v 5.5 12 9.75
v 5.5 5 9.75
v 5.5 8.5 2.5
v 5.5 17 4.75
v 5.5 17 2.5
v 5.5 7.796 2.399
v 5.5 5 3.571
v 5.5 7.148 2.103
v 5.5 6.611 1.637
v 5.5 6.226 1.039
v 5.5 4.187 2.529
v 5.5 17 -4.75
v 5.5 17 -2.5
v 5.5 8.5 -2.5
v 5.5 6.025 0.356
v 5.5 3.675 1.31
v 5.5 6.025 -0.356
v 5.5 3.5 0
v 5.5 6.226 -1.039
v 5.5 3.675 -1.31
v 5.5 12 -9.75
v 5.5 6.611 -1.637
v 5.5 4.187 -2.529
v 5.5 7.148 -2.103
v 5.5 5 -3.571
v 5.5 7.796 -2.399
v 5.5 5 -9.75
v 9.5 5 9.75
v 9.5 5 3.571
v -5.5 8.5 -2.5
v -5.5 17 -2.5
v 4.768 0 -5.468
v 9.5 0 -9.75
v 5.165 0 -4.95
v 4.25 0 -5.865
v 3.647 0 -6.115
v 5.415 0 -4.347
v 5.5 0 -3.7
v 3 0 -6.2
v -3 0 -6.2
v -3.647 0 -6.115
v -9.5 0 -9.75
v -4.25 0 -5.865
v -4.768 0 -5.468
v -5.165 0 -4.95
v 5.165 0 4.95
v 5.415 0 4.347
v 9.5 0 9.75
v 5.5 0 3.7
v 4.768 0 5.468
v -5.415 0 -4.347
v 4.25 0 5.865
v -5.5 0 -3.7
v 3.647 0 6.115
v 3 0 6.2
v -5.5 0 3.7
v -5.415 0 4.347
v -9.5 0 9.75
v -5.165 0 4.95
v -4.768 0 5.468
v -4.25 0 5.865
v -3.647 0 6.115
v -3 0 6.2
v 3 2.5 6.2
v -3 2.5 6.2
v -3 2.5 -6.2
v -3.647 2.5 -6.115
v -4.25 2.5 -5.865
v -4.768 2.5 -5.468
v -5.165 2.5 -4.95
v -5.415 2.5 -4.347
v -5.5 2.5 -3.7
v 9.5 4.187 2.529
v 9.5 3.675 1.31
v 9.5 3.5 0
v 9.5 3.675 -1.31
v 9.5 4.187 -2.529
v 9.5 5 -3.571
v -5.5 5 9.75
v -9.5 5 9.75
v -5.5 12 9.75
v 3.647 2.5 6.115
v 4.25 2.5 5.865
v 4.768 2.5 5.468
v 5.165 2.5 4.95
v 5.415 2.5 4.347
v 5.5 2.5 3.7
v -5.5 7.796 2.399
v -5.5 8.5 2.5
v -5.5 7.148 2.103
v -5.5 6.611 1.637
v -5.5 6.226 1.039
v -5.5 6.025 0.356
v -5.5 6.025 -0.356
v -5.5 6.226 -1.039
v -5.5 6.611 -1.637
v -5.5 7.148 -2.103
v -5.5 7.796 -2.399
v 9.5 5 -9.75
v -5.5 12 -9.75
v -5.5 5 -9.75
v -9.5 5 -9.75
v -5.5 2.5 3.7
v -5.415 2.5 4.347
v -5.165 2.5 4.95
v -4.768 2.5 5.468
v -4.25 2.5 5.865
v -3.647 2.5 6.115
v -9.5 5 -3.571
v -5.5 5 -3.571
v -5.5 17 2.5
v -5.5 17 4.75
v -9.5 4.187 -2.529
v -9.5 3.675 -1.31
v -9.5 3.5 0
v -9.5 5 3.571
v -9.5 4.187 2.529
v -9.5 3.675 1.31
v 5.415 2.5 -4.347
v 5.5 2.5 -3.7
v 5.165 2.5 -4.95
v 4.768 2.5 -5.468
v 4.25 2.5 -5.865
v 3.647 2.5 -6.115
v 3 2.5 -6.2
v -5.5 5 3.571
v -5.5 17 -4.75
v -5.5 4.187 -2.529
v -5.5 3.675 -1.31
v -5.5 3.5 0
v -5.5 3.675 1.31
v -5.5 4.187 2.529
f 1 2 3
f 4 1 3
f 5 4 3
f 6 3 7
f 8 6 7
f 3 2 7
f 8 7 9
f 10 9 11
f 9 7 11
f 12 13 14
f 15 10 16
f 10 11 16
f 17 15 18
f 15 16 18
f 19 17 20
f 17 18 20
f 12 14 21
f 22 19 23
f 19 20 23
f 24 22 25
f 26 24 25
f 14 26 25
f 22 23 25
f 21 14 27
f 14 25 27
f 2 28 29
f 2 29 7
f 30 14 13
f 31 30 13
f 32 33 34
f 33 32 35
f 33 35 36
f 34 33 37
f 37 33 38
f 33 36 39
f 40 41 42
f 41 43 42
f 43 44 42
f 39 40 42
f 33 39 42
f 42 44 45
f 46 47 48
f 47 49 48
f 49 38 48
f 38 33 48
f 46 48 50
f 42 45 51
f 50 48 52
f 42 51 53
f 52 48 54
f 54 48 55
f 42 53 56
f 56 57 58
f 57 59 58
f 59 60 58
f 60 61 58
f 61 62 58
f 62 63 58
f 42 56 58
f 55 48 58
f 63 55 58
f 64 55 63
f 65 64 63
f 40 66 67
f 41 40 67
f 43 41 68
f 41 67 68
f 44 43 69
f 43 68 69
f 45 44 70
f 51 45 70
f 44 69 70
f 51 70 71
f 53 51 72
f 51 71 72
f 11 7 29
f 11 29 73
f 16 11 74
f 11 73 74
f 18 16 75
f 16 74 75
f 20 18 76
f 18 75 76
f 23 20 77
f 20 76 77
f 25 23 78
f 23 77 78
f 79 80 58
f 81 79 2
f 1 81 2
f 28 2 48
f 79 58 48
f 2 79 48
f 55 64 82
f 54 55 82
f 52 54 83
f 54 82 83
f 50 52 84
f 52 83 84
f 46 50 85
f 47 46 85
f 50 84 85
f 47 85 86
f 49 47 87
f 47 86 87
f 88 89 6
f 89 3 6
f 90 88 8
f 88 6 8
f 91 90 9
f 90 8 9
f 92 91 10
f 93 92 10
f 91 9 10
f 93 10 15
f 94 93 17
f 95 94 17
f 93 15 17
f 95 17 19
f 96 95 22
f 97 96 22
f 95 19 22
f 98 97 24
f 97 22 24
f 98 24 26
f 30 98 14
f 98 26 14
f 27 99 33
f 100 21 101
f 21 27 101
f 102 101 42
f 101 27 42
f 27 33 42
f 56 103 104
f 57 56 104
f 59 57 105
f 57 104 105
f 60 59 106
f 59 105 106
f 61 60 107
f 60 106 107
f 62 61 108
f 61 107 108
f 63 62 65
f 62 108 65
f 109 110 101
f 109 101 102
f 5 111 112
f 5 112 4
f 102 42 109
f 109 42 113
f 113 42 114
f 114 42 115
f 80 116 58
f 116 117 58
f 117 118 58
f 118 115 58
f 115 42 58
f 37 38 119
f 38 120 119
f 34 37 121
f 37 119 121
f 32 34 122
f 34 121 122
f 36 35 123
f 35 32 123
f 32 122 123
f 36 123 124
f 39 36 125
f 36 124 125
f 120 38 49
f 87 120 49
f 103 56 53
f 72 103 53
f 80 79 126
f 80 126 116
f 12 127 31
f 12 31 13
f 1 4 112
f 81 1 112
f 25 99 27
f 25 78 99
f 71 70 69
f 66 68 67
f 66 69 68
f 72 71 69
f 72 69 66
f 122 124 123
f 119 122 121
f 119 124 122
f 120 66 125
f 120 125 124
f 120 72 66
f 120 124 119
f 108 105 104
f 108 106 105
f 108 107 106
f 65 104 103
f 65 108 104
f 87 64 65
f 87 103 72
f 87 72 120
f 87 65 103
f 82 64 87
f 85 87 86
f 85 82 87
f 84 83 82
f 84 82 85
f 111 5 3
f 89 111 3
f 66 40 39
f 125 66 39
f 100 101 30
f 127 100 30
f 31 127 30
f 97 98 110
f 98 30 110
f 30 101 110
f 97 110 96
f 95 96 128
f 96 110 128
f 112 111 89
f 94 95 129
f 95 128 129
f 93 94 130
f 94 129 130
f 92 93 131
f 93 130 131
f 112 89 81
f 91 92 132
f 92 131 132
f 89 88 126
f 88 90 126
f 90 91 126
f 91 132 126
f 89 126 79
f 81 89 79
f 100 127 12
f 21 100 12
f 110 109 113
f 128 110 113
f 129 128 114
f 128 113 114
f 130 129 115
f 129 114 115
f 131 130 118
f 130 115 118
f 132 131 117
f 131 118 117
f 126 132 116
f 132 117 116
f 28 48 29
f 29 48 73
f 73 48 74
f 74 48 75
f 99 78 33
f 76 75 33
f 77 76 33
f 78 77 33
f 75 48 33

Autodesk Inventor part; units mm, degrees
ref_plane "XZ Plane" through (0, 0, 0) normal (0, 1, 0) x (-1, 0, 0)
ref_plane "XY Plane" through (0, 0, 0) normal (0, 0, 1) x (1, 0, 0)
sketch "Sketch1" plane through (0, 0, 0) normal (0, 1, 0) x (-1, 0, 0)
  line L0 (9.5, 9.75) -> (-9.5, 9.75)
  line L1 (-9.5, 9.75) -> (-9.5, -9.75)
  line L2 (-9.5, -9.75) -> (9.5, -9.75)
  line L3 (9.5, -9.75) -> (9.5, 9.75)
  line L4 (9.5, 9.75) -> (-9.5, -9.75) construction
  line L5 (-9.5, 9.75) -> (9.5, -9.75) construction
  point P0 (0, 0)
  dimension "d0" = 19
  dimension "d1" = 19.5
extrude "Extrusion1" add sketch "Sketch1" along normal blind 5
sketch "Sketch2" plane through (0, 0, 0) normal (0, -1, 0) x (1, 0, 0)
  line L0 (5.5, 6.2) -> (-5.5, 6.2)
  line L1 (-5.5, 6.2) -> (-5.5, -6.2)
  line L2 (-5.5, -6.2) -> (5.5, -6.2)
  line L3 (5.5, -6.2) -> (5.5, 6.2)
  line L4 (5.5, 6.2) -> (-5.5, -6.2) construction
  line L5 (-5.5, 6.2) -> (5.5, -6.2) construction
  point P0 (0, 0)
  dimension "d4" = 11
  dimension "d5" = 12.4
extrude "Extrusion2" cut sketch "Sketch2" against normal blind 2.5
fillet "Fillet1" radius 2.5 4 edges at (-5.5, 1.25, 6.2) (5.5, 1.25, 6.2) (5.5, 1.25, -6.2) (-5.5, 1.25, -6.2)
sketch "Sketch3" plane through (0, 5, 0) normal (0, 1, 0) x (1, 0, 0)
  line L0 (9.5, 9.75) -> (-9.5, 9.75) projected
  line L1 (-5.5, -9.75) -> (5.5, -9.75)
  line L2 (5.5, -9.75) -> (5.5, 9.75)
  line L3 (5.5, 9.75) -> (-5.5, 9.75)
  line L4 (-5.5, 9.75) -> (-5.5, -9.75)
  line L5 (-5.5, -9.75) -> (5.5, 9.75) construction
  line L6 (5.5, -9.75) -> (-5.5, 9.75) construction
  point P0 (0, 0)
  dimension "d9" = 11
extrude "Extrusion3" add sketch "Sketch3" along normal blind 12
chamfer "Chamfer1" distance 5 angle 45 2 edges at (0, 17, 9.75) (0, 17, -9.75)
sketch "Sketch4" plane through (5.5, 5, 9.75) normal (1, 0, 0) x (0, 0, -1)
  line L0 (12.25, 20.5) -> (7.25, 20.5)
  line L1 (7.25, 20.5) -> (7.25, 3.5)
  line L2 (7.25, 3.5) -> (12.25, 3.5)
  line L3 (12.25, 3.5) -> (12.25, 20.5)
  line L4 (14.5, 12) -> (5, 12) projected
  line L5 (12.25, 20.5) -> (7.25, 3.5) construction
  line L6 (7.25, 20.5) -> (12.25, 3.5) construction
  circle A0 centre (9.75, 3.5) radius 2.5
  point P0 (9.75, -5)
  point P1 (9.75, 12)
  dimension "d15" = 5
  dimension "d16" = 17
extrude "Extrusion4" cut sketch "Sketch4" against normal through all
sketch "Sketch5" plane through (9.5, 0, 9.75) normal (1, 0, 0) x (0, 0, -1)
  arc A0 (7.25, 8.5) -> (12.25, 8.5) centre (9.75, 8.5) ccw projected
  circle A1 centre (9.75, 8.5) radius 5
  point P0 (9.75, 0)
  dimension "d19" = 10
extrude "Extrusion5" cut sketch "Sketch5" against normal up to surface (4 mm away)
ref_plane "Work Plane1" through (0, 0, 0) normal (1, 0, 0) x (0, 1, 0)
mirror "Mirror1" about plane through (0, 0, 0) normal (1, 0, 0) of "Extrusion5"
properties part number "Cassetto"
